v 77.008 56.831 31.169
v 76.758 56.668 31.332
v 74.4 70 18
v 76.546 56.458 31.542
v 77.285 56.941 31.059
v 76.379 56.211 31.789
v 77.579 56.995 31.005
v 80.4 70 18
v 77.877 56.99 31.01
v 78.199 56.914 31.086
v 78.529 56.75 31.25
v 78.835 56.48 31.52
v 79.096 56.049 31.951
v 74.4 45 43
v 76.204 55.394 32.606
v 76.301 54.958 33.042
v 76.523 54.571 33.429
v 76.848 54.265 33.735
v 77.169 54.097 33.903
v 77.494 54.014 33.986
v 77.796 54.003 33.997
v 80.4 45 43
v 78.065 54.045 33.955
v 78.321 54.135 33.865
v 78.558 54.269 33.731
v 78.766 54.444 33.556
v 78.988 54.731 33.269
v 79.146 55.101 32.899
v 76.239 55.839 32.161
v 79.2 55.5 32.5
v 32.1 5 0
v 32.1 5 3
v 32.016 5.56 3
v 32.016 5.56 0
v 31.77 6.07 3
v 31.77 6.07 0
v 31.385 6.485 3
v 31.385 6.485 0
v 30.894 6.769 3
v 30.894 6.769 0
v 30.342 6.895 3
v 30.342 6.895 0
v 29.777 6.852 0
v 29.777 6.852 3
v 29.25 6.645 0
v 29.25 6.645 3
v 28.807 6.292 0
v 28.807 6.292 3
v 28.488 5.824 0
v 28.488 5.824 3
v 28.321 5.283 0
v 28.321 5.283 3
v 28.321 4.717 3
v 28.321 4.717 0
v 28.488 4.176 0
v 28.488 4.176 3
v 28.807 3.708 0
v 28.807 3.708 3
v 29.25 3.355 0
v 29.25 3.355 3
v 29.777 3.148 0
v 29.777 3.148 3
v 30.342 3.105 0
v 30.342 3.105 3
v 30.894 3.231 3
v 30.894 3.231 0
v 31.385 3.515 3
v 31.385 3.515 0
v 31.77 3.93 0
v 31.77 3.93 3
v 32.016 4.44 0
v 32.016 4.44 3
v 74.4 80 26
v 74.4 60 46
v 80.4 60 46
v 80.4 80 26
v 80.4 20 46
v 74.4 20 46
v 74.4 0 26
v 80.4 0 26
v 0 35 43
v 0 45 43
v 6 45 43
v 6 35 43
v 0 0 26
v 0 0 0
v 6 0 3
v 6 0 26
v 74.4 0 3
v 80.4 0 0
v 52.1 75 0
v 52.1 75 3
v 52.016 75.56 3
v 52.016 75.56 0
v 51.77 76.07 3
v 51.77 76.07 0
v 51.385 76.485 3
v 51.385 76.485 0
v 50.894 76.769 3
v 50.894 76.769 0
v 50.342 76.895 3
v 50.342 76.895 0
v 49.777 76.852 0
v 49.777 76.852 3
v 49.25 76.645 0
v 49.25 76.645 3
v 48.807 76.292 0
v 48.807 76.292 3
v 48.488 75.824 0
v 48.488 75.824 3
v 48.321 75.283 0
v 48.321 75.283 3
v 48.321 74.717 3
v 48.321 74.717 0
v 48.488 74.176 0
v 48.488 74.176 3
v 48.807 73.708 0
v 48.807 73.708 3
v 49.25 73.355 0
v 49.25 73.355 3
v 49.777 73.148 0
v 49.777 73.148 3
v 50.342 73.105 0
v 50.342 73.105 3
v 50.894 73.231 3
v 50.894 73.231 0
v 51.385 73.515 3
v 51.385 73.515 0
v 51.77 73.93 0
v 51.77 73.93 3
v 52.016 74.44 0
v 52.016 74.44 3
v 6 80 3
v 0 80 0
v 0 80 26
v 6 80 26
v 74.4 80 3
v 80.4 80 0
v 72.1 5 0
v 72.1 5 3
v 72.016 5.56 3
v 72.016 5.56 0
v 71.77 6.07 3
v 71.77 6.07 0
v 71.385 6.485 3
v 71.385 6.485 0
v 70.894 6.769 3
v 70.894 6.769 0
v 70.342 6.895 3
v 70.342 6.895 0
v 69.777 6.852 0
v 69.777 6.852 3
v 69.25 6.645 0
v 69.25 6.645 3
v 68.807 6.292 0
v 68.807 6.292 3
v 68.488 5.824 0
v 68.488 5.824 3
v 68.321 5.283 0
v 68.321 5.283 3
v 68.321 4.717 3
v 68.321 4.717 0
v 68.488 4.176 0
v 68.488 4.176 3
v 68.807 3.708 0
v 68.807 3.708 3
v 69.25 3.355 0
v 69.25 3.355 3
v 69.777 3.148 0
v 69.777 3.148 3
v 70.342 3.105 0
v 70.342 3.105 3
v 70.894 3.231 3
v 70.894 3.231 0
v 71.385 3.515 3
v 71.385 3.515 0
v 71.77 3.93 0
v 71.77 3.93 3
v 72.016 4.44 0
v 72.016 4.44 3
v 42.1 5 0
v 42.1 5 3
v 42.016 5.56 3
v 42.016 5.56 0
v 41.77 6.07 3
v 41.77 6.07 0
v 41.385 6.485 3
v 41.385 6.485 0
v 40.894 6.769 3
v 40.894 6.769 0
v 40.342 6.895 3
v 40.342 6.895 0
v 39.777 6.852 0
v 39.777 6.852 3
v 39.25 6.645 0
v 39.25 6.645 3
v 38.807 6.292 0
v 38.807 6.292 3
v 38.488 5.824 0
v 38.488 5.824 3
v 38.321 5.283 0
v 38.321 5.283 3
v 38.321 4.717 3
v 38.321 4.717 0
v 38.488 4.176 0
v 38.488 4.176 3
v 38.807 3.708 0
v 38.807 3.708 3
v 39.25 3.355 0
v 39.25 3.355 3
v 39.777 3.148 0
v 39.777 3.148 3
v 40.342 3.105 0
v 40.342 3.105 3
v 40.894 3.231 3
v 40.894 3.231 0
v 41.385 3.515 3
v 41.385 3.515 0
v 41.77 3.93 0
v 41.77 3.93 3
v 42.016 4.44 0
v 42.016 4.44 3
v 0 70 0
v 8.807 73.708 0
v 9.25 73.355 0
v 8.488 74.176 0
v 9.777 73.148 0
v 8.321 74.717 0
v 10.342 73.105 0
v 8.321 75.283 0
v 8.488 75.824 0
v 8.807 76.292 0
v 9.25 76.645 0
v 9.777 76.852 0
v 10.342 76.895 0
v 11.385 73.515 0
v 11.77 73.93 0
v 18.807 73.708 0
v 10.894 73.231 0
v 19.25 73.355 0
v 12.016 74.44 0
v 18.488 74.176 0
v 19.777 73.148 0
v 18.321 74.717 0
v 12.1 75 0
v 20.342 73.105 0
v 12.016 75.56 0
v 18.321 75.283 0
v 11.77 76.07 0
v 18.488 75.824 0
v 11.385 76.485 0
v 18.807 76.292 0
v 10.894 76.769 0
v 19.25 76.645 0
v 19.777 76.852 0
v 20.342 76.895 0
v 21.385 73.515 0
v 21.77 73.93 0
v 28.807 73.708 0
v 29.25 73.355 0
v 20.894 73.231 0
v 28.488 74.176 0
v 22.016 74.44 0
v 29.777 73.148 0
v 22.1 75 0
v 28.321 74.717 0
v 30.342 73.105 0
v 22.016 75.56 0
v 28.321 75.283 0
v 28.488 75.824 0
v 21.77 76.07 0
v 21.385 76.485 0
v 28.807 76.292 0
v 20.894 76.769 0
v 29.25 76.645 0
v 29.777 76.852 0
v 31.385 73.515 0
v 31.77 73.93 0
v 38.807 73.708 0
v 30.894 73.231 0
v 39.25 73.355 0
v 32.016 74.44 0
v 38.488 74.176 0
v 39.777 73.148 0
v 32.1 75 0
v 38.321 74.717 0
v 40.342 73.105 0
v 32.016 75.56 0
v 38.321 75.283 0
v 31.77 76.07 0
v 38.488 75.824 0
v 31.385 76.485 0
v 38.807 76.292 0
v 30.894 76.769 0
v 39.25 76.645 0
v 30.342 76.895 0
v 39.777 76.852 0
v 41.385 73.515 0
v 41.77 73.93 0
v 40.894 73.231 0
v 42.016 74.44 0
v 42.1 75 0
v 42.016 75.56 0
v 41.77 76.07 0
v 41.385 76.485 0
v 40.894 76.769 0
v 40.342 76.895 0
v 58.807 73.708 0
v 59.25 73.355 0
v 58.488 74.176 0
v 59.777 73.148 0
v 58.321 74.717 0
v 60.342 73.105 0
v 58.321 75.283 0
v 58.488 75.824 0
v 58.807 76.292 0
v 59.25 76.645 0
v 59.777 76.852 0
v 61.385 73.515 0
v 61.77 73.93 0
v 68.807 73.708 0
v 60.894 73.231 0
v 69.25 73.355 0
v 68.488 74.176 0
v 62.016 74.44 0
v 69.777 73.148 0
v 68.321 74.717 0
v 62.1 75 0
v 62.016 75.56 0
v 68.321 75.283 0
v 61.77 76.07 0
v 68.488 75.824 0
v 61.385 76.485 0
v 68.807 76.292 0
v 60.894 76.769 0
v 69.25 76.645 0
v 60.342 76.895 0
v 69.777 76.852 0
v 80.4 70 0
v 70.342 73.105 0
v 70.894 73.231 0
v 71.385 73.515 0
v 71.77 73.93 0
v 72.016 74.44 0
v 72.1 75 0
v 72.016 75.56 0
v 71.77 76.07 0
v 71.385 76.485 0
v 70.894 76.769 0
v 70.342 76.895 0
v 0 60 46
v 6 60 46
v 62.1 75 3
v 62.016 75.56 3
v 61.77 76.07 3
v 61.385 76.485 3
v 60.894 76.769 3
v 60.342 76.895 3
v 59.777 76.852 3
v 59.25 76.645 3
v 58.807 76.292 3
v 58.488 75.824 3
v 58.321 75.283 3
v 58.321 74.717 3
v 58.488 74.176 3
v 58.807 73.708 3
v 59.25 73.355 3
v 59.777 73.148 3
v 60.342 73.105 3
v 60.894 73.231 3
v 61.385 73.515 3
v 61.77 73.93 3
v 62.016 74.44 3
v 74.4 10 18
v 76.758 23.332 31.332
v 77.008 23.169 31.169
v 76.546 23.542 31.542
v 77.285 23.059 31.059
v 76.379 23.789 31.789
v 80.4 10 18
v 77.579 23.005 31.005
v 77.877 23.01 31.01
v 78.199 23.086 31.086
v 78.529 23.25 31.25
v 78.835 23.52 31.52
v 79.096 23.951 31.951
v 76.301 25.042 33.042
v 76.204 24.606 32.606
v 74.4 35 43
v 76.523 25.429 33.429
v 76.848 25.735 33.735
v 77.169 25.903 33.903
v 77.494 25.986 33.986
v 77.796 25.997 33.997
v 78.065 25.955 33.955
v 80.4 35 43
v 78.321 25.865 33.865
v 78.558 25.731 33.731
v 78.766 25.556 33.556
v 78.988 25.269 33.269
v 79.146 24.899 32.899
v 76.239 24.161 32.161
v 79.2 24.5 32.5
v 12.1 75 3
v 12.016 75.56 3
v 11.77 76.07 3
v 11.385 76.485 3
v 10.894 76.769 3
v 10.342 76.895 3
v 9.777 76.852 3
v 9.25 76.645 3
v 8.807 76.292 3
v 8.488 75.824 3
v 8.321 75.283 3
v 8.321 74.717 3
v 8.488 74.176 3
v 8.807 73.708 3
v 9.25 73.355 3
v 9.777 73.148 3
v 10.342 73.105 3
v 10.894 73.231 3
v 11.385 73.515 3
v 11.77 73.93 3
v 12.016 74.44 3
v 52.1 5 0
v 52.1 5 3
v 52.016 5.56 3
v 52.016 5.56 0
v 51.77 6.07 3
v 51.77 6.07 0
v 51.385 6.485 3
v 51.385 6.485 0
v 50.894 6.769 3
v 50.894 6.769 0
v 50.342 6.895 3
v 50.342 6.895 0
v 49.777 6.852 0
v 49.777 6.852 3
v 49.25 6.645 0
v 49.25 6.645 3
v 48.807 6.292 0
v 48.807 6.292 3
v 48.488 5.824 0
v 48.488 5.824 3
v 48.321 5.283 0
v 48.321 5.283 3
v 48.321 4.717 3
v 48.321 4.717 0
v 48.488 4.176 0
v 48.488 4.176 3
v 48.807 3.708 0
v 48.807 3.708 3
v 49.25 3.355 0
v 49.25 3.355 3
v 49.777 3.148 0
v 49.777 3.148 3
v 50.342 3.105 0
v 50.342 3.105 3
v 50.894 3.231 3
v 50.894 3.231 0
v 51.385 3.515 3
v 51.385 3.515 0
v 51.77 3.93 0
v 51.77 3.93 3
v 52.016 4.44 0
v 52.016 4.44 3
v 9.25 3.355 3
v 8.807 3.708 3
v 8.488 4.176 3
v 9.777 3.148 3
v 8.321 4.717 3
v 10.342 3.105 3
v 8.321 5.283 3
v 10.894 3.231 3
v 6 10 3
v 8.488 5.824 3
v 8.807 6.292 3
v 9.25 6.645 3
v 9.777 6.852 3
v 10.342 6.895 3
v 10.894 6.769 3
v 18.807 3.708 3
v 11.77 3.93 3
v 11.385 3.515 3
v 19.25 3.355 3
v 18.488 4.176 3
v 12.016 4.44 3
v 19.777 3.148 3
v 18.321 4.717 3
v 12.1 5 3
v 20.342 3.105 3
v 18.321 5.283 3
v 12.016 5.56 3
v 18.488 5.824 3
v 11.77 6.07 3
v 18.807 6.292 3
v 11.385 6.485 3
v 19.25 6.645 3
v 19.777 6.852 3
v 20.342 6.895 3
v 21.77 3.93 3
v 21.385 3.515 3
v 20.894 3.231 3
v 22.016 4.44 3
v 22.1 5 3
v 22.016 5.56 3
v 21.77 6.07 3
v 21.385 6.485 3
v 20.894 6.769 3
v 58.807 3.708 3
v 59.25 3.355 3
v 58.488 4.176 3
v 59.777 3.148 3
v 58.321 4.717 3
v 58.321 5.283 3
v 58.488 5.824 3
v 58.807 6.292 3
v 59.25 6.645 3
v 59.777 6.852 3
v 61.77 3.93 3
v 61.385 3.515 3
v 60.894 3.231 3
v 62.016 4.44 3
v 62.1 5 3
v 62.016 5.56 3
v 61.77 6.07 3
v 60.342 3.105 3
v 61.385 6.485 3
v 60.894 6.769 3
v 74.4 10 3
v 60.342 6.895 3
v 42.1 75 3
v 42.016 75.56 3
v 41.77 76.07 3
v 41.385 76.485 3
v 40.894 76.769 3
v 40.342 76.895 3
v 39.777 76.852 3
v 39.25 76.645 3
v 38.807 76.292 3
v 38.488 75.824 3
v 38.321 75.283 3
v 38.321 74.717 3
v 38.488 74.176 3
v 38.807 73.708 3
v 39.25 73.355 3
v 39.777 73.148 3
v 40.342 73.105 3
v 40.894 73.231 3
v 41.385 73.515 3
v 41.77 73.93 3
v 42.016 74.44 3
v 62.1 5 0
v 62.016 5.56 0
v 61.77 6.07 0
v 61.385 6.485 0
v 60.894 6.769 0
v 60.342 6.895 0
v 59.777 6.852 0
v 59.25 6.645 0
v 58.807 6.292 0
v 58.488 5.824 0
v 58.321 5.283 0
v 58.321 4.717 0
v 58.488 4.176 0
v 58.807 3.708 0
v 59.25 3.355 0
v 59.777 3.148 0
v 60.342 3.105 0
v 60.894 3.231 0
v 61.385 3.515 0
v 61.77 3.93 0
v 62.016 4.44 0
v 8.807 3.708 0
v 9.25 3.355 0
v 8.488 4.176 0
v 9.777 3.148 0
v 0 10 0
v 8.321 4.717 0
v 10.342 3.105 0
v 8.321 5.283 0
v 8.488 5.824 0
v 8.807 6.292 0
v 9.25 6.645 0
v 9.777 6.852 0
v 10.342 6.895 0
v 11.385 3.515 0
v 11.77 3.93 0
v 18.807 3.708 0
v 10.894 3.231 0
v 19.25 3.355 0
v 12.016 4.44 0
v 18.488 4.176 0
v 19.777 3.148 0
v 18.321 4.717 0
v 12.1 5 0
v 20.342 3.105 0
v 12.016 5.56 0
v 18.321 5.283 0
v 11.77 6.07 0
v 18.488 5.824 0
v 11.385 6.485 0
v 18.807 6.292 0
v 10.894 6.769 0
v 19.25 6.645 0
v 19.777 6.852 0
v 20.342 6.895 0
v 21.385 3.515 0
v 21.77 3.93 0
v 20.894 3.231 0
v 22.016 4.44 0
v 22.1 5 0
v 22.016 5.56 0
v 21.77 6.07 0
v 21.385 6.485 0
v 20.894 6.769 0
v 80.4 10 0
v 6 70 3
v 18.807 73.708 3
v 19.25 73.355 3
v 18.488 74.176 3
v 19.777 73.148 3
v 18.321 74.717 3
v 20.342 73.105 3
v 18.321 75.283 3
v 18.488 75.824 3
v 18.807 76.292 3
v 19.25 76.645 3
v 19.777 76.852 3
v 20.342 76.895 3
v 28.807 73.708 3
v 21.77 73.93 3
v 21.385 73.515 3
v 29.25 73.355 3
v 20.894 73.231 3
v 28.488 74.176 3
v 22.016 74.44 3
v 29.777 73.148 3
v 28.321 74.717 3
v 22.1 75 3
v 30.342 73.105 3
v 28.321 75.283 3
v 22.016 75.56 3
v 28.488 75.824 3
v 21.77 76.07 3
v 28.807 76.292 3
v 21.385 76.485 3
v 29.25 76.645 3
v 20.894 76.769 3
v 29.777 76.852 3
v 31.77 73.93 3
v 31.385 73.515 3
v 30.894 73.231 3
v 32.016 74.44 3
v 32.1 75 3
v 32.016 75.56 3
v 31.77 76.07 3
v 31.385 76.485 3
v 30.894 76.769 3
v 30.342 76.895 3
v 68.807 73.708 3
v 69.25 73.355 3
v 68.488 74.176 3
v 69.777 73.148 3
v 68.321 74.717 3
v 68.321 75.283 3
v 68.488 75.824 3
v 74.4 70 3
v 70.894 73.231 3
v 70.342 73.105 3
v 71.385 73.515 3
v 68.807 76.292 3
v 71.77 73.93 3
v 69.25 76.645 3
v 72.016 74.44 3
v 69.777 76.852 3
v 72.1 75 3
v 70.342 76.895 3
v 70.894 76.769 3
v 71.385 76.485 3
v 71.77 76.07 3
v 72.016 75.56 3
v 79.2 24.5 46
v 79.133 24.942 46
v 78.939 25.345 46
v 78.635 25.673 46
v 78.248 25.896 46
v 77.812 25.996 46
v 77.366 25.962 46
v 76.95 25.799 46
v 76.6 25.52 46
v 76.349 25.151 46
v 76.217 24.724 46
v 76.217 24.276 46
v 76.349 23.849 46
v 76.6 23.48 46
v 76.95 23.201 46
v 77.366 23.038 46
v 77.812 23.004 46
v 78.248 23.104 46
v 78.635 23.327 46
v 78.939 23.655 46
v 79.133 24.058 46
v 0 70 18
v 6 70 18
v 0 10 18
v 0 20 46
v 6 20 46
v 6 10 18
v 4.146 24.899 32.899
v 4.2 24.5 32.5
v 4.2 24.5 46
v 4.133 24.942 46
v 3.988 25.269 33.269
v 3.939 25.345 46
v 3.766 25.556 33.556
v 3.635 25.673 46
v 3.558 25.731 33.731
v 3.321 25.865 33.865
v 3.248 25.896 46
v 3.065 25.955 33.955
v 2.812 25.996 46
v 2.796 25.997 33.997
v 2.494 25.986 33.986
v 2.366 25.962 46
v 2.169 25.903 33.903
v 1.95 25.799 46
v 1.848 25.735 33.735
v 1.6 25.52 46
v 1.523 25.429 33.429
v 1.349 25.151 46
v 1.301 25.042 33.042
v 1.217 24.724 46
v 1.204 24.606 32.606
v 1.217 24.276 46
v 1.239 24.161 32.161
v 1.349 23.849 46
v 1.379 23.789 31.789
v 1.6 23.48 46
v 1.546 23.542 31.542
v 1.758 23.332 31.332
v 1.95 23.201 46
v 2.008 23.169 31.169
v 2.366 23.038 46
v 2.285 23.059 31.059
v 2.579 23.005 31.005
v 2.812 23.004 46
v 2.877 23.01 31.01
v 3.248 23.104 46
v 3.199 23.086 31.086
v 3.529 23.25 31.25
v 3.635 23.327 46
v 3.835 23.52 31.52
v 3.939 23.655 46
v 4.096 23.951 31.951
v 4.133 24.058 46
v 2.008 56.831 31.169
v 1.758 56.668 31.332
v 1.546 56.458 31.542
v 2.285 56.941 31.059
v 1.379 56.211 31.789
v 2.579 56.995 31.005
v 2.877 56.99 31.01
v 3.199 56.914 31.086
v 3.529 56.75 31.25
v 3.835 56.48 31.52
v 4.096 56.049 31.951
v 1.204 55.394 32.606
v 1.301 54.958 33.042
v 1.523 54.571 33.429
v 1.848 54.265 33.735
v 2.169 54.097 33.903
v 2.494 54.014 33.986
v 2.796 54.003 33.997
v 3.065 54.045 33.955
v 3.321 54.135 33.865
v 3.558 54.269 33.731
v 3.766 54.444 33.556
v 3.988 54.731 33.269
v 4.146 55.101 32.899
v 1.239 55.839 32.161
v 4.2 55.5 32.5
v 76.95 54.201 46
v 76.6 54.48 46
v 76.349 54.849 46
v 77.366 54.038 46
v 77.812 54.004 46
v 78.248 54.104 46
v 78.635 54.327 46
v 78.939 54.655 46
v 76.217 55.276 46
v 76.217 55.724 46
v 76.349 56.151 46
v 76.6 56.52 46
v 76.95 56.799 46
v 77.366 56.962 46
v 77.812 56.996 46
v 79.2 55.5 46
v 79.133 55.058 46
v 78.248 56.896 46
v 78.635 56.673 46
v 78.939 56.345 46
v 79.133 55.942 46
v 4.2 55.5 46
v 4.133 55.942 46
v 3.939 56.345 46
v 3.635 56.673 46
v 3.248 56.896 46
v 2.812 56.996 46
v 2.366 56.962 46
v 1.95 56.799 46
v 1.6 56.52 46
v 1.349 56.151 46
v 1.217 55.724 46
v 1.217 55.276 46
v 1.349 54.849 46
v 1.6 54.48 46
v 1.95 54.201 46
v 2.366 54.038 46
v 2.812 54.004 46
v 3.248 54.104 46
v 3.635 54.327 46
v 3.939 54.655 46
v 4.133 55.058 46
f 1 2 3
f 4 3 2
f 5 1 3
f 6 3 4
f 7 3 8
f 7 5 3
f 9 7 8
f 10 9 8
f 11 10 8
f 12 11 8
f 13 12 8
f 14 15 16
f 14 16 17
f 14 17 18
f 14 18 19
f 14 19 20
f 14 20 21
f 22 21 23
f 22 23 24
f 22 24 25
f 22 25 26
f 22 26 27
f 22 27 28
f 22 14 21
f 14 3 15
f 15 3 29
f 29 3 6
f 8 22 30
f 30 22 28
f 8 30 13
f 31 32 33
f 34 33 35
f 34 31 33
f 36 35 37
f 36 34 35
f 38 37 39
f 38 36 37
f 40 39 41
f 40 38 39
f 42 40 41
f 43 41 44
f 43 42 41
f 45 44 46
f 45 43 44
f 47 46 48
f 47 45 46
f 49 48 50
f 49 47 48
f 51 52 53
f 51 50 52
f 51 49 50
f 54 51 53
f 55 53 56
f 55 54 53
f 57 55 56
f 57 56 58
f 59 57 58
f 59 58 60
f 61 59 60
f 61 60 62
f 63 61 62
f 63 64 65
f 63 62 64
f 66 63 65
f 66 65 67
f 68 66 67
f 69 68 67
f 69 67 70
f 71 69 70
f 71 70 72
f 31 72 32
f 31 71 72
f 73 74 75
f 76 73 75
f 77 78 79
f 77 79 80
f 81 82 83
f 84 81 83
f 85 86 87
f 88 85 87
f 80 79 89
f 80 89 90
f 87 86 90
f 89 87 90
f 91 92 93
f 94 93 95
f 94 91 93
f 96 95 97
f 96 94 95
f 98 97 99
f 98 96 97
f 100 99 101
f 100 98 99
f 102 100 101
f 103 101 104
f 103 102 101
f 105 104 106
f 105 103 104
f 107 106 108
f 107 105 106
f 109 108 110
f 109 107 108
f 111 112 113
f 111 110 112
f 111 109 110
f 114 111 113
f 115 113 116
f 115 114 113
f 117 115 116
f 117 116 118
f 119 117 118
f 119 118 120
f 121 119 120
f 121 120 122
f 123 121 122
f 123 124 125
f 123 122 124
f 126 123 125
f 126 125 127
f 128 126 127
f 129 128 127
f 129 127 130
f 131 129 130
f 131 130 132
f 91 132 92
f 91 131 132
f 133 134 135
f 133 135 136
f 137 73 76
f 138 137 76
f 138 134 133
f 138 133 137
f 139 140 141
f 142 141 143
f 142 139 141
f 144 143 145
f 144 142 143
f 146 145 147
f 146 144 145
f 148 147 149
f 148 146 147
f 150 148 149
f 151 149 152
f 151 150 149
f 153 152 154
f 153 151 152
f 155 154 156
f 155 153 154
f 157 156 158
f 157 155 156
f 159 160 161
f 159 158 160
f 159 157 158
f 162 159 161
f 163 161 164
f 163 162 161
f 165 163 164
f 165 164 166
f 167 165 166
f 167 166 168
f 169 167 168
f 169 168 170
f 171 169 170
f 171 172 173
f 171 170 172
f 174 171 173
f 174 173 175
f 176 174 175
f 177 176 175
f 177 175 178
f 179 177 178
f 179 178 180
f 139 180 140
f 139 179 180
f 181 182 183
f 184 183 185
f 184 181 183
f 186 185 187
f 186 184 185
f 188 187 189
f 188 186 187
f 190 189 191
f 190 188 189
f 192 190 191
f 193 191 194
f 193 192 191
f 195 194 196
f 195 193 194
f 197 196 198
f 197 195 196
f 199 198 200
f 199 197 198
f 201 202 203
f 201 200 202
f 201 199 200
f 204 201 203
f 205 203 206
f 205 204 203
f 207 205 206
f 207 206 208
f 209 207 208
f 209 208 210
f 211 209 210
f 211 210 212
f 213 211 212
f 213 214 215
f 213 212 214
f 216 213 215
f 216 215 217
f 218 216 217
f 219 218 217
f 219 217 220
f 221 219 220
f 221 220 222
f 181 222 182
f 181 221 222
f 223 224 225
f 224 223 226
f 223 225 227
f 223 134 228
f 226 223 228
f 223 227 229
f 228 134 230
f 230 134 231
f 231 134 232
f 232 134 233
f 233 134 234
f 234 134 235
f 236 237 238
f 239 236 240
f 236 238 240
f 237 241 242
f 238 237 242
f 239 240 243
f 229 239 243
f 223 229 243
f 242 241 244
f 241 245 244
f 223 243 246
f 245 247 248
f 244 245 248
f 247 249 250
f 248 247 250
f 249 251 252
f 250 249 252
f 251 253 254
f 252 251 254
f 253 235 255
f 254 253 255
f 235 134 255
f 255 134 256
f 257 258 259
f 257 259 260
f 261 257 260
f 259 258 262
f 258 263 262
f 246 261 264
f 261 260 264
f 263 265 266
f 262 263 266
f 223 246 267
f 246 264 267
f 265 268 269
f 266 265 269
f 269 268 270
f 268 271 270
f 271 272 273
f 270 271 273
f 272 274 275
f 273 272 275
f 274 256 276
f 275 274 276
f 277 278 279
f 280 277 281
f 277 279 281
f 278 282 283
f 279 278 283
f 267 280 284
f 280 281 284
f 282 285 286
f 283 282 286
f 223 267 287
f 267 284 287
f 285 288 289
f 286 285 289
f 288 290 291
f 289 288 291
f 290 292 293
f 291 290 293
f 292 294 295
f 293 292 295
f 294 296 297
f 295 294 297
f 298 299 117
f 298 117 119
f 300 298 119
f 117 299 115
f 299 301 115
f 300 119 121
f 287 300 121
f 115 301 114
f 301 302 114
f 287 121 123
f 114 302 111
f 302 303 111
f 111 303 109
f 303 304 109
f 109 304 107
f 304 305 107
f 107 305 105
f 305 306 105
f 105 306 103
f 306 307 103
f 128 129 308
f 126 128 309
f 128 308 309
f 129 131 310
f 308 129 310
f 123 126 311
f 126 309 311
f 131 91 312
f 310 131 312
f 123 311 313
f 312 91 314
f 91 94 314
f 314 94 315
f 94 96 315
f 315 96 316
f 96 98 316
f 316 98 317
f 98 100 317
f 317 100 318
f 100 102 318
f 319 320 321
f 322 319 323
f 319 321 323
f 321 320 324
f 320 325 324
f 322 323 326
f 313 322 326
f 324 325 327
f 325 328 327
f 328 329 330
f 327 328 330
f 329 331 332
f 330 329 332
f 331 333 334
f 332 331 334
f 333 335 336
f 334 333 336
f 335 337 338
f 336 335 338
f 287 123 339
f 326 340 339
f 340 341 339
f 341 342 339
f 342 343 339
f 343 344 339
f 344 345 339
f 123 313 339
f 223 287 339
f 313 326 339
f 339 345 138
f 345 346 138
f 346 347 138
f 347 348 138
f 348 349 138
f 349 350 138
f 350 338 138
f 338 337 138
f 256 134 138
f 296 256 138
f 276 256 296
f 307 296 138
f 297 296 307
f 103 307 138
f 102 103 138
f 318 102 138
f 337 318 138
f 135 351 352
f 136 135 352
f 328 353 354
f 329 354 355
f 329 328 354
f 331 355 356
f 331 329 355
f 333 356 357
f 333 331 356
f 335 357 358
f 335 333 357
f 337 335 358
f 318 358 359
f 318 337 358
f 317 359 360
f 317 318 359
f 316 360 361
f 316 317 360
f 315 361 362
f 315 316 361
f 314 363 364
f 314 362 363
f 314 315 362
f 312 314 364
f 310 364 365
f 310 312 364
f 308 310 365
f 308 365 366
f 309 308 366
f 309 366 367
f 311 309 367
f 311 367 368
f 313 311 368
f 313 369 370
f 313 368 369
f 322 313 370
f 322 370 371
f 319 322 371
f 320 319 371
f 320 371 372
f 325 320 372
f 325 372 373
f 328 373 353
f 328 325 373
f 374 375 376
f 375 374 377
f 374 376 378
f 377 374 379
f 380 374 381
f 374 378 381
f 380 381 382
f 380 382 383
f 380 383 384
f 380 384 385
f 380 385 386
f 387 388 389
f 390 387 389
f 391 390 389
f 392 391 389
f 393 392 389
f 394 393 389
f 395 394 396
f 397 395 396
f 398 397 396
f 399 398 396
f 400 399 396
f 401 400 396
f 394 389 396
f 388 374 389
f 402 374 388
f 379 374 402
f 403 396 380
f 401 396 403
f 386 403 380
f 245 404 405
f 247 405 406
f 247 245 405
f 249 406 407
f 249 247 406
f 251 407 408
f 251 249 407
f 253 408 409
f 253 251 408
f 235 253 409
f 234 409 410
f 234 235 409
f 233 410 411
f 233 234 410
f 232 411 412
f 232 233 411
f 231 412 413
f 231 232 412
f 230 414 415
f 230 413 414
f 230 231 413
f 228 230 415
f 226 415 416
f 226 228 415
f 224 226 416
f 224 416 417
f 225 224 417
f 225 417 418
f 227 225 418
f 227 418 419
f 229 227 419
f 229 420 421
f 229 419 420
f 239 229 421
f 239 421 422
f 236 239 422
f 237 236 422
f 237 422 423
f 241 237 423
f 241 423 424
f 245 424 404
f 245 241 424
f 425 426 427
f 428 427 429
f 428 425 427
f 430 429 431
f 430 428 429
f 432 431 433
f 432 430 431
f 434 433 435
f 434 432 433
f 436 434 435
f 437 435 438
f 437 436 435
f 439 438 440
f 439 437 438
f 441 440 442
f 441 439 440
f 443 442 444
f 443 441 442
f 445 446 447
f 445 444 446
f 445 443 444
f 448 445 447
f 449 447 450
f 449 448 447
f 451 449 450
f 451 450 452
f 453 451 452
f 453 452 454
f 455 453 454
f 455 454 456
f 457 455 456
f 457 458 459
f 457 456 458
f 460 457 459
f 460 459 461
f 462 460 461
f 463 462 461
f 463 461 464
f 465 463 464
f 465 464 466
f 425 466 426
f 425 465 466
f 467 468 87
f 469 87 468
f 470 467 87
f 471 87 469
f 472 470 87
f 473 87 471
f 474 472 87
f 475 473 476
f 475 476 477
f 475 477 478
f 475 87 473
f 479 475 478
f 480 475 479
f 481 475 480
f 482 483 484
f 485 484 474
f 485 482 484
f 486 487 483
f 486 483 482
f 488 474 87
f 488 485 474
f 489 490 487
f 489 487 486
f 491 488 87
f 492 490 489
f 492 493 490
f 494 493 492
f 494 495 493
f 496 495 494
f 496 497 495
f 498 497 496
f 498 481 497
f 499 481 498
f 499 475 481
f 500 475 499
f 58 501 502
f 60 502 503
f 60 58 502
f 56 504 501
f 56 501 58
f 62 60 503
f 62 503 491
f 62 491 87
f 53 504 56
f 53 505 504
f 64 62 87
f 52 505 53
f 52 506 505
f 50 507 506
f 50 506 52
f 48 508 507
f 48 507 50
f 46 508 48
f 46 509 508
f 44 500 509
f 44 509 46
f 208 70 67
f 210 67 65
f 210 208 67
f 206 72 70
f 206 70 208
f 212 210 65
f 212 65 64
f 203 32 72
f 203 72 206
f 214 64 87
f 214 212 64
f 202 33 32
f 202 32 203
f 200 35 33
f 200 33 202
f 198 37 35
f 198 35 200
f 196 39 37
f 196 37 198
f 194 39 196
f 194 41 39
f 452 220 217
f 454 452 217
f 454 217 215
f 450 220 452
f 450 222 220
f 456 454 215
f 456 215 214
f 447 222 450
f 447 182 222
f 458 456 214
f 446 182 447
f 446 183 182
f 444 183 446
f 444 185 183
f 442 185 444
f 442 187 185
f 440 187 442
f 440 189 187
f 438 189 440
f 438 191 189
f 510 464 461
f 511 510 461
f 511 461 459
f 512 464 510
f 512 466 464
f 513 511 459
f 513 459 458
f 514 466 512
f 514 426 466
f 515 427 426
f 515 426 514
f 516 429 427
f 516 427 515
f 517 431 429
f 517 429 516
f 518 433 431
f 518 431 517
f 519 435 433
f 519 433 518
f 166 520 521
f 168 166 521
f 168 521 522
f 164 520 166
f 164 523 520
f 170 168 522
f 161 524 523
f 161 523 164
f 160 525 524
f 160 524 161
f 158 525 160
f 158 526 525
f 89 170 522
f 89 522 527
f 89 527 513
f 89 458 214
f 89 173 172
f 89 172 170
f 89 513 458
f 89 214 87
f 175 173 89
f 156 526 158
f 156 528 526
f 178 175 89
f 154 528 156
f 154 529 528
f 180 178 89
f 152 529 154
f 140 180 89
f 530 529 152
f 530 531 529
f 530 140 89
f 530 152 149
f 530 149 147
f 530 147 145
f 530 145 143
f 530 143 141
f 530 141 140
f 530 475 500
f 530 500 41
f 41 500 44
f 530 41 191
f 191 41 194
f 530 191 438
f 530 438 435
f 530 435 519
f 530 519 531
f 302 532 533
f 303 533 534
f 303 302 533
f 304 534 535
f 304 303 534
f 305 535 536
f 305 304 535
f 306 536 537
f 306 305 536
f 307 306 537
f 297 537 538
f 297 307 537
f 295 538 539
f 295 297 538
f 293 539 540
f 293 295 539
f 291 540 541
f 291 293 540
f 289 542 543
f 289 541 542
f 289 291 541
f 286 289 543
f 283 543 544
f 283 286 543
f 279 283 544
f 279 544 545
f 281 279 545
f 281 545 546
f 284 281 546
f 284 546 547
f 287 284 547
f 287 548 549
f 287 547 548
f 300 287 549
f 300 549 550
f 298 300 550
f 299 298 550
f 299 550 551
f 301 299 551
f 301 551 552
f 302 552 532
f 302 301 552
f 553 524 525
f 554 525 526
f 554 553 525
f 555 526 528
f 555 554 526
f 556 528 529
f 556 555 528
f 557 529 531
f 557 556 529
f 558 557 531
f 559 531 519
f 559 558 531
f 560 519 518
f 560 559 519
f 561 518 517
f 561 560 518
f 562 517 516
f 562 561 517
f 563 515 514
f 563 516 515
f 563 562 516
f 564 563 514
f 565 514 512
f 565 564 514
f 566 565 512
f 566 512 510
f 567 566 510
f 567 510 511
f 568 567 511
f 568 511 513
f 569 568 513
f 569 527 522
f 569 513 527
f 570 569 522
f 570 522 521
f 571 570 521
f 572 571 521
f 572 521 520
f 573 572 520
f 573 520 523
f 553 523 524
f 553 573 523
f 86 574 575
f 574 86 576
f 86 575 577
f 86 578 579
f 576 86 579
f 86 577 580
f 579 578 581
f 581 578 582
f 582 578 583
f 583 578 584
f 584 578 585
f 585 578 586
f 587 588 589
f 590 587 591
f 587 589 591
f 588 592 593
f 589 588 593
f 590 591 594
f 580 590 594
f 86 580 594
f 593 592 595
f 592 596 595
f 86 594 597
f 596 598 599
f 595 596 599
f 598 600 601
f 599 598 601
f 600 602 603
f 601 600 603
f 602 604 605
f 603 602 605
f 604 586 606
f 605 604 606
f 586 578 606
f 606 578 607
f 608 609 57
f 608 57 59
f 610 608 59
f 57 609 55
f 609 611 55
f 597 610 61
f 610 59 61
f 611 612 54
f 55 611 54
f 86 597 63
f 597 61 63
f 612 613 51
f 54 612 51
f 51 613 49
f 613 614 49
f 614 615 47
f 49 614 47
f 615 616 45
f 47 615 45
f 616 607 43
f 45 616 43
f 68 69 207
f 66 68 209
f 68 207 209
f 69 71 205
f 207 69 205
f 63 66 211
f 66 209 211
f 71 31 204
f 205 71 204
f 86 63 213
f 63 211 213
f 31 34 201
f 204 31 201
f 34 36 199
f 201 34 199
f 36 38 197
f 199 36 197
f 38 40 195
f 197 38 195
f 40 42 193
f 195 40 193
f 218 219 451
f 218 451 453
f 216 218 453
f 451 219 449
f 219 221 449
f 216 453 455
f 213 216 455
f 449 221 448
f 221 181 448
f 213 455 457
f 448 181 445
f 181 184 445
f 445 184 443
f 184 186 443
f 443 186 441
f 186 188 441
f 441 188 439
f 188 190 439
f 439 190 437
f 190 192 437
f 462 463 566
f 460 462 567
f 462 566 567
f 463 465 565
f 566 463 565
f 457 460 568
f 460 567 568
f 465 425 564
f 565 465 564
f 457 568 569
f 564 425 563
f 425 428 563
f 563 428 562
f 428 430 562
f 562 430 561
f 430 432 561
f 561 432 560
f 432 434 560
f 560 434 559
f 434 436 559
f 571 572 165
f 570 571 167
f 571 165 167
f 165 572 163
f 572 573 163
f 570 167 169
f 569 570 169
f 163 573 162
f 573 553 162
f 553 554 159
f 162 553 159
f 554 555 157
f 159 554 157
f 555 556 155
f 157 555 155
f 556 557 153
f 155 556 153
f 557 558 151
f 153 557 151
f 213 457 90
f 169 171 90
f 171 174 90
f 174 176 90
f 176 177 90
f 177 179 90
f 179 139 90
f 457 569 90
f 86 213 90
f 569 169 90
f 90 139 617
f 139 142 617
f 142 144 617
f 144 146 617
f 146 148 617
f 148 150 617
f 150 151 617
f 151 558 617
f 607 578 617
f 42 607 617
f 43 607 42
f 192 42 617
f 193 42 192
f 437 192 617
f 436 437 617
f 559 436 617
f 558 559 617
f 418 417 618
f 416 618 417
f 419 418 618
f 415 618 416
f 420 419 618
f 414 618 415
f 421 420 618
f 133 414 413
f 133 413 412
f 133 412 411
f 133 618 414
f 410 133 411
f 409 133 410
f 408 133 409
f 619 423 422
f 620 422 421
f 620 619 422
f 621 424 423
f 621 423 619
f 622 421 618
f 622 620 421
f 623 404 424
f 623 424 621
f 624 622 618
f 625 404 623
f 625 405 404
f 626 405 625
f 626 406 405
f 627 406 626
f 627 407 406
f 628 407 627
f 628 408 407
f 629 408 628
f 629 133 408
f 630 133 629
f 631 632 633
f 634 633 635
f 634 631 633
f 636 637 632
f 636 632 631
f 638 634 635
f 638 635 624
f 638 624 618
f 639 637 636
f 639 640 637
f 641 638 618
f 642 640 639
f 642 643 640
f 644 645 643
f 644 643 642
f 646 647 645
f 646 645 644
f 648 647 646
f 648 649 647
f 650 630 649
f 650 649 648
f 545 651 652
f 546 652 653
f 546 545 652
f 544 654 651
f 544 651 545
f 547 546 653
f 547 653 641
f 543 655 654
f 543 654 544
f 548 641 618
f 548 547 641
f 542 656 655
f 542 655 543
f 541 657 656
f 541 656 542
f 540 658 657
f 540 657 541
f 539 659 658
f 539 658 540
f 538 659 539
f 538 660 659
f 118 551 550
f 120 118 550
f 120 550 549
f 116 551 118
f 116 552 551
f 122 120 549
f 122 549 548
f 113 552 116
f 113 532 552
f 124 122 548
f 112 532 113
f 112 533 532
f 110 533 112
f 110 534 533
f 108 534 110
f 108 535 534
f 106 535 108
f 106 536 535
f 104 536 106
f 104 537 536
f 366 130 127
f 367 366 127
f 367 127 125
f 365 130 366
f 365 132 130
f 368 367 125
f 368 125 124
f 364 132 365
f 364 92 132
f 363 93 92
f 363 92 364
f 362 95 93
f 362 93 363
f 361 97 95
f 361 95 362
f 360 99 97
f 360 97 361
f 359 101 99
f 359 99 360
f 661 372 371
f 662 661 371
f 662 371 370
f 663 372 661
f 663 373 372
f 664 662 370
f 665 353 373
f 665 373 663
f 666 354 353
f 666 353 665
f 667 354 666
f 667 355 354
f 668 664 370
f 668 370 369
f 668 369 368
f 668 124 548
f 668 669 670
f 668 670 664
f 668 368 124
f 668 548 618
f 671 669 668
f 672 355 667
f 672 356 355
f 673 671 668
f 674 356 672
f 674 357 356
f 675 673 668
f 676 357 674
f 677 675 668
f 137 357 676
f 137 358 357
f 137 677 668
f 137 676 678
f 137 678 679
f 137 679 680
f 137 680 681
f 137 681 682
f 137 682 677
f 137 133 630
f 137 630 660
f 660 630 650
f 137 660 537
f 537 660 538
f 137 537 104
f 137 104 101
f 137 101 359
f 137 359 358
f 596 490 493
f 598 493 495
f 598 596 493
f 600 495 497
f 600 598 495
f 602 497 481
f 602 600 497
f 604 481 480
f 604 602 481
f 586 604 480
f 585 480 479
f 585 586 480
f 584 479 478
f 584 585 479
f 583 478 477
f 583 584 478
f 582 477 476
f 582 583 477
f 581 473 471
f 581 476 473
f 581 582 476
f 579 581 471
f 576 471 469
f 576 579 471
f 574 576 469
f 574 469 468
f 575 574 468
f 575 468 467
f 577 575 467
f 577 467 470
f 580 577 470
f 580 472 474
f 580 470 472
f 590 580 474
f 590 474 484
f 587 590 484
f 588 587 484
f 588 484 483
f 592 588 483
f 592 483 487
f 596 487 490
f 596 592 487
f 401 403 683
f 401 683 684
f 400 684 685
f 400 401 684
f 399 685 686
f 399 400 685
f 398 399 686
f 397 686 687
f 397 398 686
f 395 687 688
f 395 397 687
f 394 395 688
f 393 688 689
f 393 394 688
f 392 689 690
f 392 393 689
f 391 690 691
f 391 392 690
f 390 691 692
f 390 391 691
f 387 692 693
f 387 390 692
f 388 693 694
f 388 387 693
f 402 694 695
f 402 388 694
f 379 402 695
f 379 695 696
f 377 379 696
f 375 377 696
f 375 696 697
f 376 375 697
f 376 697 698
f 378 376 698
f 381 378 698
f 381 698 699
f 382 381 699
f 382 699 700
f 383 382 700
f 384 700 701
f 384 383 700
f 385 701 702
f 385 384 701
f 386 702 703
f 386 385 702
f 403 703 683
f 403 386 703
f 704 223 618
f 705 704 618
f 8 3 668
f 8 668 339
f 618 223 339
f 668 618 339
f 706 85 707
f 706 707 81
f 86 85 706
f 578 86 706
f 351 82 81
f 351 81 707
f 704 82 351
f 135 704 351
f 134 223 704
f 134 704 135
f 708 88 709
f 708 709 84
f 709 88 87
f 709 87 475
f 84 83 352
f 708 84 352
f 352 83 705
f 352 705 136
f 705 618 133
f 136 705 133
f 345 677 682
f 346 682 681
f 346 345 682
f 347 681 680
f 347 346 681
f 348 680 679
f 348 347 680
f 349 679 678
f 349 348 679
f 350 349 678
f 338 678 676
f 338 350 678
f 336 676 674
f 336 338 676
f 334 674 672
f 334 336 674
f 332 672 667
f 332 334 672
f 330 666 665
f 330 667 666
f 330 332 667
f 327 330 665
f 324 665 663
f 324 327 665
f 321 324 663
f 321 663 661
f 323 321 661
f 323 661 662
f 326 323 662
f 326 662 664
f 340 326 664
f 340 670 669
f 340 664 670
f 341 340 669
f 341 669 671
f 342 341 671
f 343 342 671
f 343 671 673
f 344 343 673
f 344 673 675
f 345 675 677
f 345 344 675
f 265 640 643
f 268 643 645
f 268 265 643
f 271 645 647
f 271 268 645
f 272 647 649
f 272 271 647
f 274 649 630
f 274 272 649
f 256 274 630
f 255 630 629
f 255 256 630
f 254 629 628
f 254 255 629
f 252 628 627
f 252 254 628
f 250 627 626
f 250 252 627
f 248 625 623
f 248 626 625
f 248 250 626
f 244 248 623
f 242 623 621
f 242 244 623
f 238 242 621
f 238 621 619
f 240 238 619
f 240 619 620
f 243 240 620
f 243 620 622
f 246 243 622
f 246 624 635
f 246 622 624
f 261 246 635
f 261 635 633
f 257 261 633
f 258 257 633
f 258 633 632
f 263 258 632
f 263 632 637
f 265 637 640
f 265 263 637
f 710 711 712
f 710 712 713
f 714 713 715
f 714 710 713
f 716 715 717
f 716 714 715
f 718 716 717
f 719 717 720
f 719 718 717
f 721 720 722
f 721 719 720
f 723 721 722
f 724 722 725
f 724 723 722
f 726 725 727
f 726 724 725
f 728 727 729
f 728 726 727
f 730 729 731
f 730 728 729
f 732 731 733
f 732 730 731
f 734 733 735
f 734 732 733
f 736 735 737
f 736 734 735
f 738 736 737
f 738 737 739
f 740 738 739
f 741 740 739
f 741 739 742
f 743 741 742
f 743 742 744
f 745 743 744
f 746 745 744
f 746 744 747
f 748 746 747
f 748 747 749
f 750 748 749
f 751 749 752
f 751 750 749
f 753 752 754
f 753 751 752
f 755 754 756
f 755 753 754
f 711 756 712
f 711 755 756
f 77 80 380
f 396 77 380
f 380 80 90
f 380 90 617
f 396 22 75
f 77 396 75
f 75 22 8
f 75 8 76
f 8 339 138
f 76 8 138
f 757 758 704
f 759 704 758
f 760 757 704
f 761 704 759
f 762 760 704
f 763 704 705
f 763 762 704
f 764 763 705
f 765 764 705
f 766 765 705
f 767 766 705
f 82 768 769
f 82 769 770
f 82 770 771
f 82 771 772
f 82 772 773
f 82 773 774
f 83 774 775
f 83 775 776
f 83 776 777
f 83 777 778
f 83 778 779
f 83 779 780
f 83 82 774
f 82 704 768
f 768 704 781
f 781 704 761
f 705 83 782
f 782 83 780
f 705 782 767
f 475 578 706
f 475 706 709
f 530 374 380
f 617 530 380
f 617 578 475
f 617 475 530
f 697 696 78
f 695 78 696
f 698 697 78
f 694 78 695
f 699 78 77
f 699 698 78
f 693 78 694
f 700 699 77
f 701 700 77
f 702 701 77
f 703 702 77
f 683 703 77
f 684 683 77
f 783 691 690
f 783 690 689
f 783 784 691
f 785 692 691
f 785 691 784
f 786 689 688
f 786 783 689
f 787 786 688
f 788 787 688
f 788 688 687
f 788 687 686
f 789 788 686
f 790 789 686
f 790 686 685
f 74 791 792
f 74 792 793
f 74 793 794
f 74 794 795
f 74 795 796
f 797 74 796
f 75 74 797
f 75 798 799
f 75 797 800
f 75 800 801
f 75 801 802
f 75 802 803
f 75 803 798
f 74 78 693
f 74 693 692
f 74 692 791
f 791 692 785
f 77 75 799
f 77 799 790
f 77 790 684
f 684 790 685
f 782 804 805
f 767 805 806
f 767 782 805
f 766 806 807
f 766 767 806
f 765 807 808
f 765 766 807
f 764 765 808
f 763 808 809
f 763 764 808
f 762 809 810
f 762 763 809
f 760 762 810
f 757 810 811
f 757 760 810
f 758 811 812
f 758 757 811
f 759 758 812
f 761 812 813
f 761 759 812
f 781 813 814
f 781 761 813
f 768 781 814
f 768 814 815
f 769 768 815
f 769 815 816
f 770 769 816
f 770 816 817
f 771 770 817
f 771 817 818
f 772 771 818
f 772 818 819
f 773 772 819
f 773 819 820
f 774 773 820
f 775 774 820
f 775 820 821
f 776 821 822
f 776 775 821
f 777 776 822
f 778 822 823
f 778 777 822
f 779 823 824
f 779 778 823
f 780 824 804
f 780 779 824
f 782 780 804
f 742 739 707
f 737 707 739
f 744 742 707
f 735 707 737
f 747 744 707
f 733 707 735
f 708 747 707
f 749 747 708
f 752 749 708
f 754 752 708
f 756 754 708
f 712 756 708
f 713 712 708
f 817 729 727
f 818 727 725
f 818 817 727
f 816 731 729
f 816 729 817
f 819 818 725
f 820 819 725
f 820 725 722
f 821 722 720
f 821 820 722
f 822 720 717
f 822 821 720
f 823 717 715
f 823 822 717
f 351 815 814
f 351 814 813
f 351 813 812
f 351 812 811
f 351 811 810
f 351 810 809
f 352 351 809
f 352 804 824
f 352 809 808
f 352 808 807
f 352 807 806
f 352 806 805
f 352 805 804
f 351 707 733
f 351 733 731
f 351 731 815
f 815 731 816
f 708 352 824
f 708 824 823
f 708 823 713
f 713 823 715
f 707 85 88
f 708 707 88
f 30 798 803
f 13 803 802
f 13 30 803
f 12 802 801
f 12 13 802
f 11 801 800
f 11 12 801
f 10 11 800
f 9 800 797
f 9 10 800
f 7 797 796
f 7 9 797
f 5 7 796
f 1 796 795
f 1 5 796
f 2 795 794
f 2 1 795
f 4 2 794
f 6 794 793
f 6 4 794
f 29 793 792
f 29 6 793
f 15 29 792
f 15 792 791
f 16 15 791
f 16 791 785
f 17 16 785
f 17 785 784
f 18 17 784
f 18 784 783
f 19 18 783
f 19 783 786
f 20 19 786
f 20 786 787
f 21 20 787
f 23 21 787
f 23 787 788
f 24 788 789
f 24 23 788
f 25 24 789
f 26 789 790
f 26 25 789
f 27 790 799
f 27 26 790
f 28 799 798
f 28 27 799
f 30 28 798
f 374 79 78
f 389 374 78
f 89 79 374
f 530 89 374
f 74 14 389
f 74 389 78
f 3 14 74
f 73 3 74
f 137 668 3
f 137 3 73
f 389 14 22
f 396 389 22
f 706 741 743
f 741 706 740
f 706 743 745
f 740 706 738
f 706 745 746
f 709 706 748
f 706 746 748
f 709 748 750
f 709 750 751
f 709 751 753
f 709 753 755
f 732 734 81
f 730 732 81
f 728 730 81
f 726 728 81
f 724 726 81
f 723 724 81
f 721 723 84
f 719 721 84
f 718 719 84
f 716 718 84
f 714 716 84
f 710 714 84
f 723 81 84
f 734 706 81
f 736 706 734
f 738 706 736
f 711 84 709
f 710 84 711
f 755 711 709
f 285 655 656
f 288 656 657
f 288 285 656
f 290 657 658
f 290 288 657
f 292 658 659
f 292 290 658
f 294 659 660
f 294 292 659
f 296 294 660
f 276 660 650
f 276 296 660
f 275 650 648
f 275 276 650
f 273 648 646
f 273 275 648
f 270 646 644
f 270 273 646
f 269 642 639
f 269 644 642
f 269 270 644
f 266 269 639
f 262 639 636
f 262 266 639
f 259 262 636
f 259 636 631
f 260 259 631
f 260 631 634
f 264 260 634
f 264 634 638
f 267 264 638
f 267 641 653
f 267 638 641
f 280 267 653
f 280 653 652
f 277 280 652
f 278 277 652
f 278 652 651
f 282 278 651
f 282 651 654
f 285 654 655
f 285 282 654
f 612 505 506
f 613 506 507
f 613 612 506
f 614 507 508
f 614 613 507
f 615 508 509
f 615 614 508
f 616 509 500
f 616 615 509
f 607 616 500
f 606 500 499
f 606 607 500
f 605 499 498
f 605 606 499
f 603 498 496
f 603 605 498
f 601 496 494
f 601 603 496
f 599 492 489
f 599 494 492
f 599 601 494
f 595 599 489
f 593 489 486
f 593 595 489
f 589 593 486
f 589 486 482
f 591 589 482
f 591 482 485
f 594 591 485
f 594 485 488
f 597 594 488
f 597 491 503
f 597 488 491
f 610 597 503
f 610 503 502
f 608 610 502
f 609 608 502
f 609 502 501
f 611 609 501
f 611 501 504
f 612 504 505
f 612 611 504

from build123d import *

# Parameters (mm, degrees)
BOX012_W          = 68.4
BOX012_H          = 80
BOX012_DEPTH      = 43
CYLINDER003_R     = 1.5
CYLINDER003_DEPTH = 50
ARRAY005_X_COUNT  = 2
ARRAY005_X_PITCH  = 75
ARRAY005_Y_COUNT  = 2
ARRAY005_Y_PITCH  = 31
CYLINDER004_R     = 1.9
CYLINDER004_DEPTH = 10
ARRAY_X_COUNT     = 7
ARRAY_X_PITCH     = 10
ARRAY_Y_COUNT     = 8
ARRAY_Y_PITCH     = 10
BOX010_W          = 80.4
BOX010_H          = 60
BOX010_DEPTH      = 43
CHAMFER001_SIZE   = 25
BOX011_W          = 68.4
BOX011_H          = 80
BOX011_DEPTH      = 40
BOX009_W          = 80.4
BOX009_H          = 80
BOX009_DEPTH      = 46
CHAMFER002_SIZE   = 20


with BuildPart() as v_cube_extract001:
    # Box012 → Box012 (new body)
    with BuildSketch(Plane(origin=(6, 0, 3), x_dir=(1, 0, 0), z_dir=(0, 0, 1))):
        with Locations((34.2, 40)):
            Rectangle(BOX012_W, BOX012_H)
    extrude(amount=BOX012_DEPTH)


with BuildPart() as screw_hole_array:
    # Cylinder003 → Cylinder003 (new body)
    with BuildSketch(Plane.XY.offset(-40)):
        Circle(CYLINDER003_R)
    extrude(amount=CYLINDER003_DEPTH)

    # Array005 X: screw hole array ×2


with BuildPart() as screw_hole_array_1:
    add(screw_hole_array.part)
    with Locations(*[(i * ARRAY005_X_PITCH, 0, 0) for i in range(1, ARRAY005_X_COUNT)]):
        add(screw_hole_array.part)

    # Array005 Y: screw hole array ×2


with BuildPart() as screw_hole_array_2:
    add(screw_hole_array_1.part)
    with Locations(*[(0, i * ARRAY005_Y_PITCH, 0) for i in range(1, ARRAY005_Y_COUNT)]):
        add(screw_hole_array_1.part)


with BuildPart() as screw_hole_array_3:
    # Array005 placement: moved
    add(screw_hole_array_2.part.moved(Location((2.7, 24.5, 43))))


with BuildPart() as attachment_hole_array:
    # Cylinder004 → Cylinder004 (new body)
    with BuildSketch(Plane.XY):
        Circle(CYLINDER004_R)
    extrude(amount=CYLINDER004_DEPTH)

    # Array X: attachment hole array ×7


with BuildPart() as attachment_hole_array_1:
    add(attachment_hole_array.part)
    with Locations(*[(i * ARRAY_X_PITCH, 0, 0) for i in range(1, ARRAY_X_COUNT)]):
        add(attachment_hole_array.part)

    # Array Y: attachment hole array ×8


with BuildPart() as attachment_hole_array_2:
    add(attachment_hole_array_1.part)
    with Locations(*[(0, i * ARRAY_Y_PITCH, 0) for i in range(1, ARRAY_Y_COUNT)]):
        add(attachment_hole_array_1.part)


with BuildPart() as attachment_hole_array_3:
    # Array placement: moved
    add(attachment_hole_array_2.part.moved(Location((10.2, 5, 0))))


with BuildPart() as v_cube_extract_chamfer:
    # Box010 → Box010 (new body)
    with BuildSketch(Plane(origin=(0, 10, 0), x_dir=(1, 0, 0), z_dir=(0, 0, 1))):
        with Locations((40.2, 30)):
            Rectangle(BOX010_W, BOX010_H)
    extrude(amount=BOX010_DEPTH)

    # Chamfer001
    chamfer001_edges = [v_cube_extract_chamfer.edges().sort_by_distance(p)[0] for p in [
        (40.2, 10, 43),
        (40.2, 70, 43),
    ]]
    chamfer(chamfer001_edges, length=CHAMFER001_SIZE)


with BuildPart() as v_extract_union:
    # Box011 → Box011 (new body)
    with BuildSketch(Plane(origin=(6, 0, 3), x_dir=(1, 0, 0), z_dir=(0, 0, 1))):
        with Locations((34.2, 40)):
            Rectangle(BOX011_W, BOX011_H)
    extrude(amount=BOX011_DEPTH)

    # Fusion005: union v cube extract001, screw hole array, attachment hole array, v cube extract chamfer
    add(v_cube_extract001.part)
    add(screw_hole_array_3.part)
    add(attachment_hole_array_3.part)
    add(v_cube_extract_chamfer.part)


with BuildPart() as v_cut:
    # Box009 → Box009 (new body)
    with BuildSketch(Plane.XY):
        with Locations((40.2, 40)):
            Rectangle(BOX009_W, BOX009_H)
    extrude(amount=BOX009_DEPTH)

    # Chamfer002
    chamfer002_edges = [v_cut.edges().sort_by_distance(p)[0] for p in [
        (40.2, 0, 46),
        (40.2, 80, 46),
    ]]
    chamfer(chamfer002_edges, length=CHAMFER002_SIZE)

    # Cut003002: cut v extract union
    add(v_extract_union.part, mode=Mode.SUBTRACT)


solid = v_cut.part
